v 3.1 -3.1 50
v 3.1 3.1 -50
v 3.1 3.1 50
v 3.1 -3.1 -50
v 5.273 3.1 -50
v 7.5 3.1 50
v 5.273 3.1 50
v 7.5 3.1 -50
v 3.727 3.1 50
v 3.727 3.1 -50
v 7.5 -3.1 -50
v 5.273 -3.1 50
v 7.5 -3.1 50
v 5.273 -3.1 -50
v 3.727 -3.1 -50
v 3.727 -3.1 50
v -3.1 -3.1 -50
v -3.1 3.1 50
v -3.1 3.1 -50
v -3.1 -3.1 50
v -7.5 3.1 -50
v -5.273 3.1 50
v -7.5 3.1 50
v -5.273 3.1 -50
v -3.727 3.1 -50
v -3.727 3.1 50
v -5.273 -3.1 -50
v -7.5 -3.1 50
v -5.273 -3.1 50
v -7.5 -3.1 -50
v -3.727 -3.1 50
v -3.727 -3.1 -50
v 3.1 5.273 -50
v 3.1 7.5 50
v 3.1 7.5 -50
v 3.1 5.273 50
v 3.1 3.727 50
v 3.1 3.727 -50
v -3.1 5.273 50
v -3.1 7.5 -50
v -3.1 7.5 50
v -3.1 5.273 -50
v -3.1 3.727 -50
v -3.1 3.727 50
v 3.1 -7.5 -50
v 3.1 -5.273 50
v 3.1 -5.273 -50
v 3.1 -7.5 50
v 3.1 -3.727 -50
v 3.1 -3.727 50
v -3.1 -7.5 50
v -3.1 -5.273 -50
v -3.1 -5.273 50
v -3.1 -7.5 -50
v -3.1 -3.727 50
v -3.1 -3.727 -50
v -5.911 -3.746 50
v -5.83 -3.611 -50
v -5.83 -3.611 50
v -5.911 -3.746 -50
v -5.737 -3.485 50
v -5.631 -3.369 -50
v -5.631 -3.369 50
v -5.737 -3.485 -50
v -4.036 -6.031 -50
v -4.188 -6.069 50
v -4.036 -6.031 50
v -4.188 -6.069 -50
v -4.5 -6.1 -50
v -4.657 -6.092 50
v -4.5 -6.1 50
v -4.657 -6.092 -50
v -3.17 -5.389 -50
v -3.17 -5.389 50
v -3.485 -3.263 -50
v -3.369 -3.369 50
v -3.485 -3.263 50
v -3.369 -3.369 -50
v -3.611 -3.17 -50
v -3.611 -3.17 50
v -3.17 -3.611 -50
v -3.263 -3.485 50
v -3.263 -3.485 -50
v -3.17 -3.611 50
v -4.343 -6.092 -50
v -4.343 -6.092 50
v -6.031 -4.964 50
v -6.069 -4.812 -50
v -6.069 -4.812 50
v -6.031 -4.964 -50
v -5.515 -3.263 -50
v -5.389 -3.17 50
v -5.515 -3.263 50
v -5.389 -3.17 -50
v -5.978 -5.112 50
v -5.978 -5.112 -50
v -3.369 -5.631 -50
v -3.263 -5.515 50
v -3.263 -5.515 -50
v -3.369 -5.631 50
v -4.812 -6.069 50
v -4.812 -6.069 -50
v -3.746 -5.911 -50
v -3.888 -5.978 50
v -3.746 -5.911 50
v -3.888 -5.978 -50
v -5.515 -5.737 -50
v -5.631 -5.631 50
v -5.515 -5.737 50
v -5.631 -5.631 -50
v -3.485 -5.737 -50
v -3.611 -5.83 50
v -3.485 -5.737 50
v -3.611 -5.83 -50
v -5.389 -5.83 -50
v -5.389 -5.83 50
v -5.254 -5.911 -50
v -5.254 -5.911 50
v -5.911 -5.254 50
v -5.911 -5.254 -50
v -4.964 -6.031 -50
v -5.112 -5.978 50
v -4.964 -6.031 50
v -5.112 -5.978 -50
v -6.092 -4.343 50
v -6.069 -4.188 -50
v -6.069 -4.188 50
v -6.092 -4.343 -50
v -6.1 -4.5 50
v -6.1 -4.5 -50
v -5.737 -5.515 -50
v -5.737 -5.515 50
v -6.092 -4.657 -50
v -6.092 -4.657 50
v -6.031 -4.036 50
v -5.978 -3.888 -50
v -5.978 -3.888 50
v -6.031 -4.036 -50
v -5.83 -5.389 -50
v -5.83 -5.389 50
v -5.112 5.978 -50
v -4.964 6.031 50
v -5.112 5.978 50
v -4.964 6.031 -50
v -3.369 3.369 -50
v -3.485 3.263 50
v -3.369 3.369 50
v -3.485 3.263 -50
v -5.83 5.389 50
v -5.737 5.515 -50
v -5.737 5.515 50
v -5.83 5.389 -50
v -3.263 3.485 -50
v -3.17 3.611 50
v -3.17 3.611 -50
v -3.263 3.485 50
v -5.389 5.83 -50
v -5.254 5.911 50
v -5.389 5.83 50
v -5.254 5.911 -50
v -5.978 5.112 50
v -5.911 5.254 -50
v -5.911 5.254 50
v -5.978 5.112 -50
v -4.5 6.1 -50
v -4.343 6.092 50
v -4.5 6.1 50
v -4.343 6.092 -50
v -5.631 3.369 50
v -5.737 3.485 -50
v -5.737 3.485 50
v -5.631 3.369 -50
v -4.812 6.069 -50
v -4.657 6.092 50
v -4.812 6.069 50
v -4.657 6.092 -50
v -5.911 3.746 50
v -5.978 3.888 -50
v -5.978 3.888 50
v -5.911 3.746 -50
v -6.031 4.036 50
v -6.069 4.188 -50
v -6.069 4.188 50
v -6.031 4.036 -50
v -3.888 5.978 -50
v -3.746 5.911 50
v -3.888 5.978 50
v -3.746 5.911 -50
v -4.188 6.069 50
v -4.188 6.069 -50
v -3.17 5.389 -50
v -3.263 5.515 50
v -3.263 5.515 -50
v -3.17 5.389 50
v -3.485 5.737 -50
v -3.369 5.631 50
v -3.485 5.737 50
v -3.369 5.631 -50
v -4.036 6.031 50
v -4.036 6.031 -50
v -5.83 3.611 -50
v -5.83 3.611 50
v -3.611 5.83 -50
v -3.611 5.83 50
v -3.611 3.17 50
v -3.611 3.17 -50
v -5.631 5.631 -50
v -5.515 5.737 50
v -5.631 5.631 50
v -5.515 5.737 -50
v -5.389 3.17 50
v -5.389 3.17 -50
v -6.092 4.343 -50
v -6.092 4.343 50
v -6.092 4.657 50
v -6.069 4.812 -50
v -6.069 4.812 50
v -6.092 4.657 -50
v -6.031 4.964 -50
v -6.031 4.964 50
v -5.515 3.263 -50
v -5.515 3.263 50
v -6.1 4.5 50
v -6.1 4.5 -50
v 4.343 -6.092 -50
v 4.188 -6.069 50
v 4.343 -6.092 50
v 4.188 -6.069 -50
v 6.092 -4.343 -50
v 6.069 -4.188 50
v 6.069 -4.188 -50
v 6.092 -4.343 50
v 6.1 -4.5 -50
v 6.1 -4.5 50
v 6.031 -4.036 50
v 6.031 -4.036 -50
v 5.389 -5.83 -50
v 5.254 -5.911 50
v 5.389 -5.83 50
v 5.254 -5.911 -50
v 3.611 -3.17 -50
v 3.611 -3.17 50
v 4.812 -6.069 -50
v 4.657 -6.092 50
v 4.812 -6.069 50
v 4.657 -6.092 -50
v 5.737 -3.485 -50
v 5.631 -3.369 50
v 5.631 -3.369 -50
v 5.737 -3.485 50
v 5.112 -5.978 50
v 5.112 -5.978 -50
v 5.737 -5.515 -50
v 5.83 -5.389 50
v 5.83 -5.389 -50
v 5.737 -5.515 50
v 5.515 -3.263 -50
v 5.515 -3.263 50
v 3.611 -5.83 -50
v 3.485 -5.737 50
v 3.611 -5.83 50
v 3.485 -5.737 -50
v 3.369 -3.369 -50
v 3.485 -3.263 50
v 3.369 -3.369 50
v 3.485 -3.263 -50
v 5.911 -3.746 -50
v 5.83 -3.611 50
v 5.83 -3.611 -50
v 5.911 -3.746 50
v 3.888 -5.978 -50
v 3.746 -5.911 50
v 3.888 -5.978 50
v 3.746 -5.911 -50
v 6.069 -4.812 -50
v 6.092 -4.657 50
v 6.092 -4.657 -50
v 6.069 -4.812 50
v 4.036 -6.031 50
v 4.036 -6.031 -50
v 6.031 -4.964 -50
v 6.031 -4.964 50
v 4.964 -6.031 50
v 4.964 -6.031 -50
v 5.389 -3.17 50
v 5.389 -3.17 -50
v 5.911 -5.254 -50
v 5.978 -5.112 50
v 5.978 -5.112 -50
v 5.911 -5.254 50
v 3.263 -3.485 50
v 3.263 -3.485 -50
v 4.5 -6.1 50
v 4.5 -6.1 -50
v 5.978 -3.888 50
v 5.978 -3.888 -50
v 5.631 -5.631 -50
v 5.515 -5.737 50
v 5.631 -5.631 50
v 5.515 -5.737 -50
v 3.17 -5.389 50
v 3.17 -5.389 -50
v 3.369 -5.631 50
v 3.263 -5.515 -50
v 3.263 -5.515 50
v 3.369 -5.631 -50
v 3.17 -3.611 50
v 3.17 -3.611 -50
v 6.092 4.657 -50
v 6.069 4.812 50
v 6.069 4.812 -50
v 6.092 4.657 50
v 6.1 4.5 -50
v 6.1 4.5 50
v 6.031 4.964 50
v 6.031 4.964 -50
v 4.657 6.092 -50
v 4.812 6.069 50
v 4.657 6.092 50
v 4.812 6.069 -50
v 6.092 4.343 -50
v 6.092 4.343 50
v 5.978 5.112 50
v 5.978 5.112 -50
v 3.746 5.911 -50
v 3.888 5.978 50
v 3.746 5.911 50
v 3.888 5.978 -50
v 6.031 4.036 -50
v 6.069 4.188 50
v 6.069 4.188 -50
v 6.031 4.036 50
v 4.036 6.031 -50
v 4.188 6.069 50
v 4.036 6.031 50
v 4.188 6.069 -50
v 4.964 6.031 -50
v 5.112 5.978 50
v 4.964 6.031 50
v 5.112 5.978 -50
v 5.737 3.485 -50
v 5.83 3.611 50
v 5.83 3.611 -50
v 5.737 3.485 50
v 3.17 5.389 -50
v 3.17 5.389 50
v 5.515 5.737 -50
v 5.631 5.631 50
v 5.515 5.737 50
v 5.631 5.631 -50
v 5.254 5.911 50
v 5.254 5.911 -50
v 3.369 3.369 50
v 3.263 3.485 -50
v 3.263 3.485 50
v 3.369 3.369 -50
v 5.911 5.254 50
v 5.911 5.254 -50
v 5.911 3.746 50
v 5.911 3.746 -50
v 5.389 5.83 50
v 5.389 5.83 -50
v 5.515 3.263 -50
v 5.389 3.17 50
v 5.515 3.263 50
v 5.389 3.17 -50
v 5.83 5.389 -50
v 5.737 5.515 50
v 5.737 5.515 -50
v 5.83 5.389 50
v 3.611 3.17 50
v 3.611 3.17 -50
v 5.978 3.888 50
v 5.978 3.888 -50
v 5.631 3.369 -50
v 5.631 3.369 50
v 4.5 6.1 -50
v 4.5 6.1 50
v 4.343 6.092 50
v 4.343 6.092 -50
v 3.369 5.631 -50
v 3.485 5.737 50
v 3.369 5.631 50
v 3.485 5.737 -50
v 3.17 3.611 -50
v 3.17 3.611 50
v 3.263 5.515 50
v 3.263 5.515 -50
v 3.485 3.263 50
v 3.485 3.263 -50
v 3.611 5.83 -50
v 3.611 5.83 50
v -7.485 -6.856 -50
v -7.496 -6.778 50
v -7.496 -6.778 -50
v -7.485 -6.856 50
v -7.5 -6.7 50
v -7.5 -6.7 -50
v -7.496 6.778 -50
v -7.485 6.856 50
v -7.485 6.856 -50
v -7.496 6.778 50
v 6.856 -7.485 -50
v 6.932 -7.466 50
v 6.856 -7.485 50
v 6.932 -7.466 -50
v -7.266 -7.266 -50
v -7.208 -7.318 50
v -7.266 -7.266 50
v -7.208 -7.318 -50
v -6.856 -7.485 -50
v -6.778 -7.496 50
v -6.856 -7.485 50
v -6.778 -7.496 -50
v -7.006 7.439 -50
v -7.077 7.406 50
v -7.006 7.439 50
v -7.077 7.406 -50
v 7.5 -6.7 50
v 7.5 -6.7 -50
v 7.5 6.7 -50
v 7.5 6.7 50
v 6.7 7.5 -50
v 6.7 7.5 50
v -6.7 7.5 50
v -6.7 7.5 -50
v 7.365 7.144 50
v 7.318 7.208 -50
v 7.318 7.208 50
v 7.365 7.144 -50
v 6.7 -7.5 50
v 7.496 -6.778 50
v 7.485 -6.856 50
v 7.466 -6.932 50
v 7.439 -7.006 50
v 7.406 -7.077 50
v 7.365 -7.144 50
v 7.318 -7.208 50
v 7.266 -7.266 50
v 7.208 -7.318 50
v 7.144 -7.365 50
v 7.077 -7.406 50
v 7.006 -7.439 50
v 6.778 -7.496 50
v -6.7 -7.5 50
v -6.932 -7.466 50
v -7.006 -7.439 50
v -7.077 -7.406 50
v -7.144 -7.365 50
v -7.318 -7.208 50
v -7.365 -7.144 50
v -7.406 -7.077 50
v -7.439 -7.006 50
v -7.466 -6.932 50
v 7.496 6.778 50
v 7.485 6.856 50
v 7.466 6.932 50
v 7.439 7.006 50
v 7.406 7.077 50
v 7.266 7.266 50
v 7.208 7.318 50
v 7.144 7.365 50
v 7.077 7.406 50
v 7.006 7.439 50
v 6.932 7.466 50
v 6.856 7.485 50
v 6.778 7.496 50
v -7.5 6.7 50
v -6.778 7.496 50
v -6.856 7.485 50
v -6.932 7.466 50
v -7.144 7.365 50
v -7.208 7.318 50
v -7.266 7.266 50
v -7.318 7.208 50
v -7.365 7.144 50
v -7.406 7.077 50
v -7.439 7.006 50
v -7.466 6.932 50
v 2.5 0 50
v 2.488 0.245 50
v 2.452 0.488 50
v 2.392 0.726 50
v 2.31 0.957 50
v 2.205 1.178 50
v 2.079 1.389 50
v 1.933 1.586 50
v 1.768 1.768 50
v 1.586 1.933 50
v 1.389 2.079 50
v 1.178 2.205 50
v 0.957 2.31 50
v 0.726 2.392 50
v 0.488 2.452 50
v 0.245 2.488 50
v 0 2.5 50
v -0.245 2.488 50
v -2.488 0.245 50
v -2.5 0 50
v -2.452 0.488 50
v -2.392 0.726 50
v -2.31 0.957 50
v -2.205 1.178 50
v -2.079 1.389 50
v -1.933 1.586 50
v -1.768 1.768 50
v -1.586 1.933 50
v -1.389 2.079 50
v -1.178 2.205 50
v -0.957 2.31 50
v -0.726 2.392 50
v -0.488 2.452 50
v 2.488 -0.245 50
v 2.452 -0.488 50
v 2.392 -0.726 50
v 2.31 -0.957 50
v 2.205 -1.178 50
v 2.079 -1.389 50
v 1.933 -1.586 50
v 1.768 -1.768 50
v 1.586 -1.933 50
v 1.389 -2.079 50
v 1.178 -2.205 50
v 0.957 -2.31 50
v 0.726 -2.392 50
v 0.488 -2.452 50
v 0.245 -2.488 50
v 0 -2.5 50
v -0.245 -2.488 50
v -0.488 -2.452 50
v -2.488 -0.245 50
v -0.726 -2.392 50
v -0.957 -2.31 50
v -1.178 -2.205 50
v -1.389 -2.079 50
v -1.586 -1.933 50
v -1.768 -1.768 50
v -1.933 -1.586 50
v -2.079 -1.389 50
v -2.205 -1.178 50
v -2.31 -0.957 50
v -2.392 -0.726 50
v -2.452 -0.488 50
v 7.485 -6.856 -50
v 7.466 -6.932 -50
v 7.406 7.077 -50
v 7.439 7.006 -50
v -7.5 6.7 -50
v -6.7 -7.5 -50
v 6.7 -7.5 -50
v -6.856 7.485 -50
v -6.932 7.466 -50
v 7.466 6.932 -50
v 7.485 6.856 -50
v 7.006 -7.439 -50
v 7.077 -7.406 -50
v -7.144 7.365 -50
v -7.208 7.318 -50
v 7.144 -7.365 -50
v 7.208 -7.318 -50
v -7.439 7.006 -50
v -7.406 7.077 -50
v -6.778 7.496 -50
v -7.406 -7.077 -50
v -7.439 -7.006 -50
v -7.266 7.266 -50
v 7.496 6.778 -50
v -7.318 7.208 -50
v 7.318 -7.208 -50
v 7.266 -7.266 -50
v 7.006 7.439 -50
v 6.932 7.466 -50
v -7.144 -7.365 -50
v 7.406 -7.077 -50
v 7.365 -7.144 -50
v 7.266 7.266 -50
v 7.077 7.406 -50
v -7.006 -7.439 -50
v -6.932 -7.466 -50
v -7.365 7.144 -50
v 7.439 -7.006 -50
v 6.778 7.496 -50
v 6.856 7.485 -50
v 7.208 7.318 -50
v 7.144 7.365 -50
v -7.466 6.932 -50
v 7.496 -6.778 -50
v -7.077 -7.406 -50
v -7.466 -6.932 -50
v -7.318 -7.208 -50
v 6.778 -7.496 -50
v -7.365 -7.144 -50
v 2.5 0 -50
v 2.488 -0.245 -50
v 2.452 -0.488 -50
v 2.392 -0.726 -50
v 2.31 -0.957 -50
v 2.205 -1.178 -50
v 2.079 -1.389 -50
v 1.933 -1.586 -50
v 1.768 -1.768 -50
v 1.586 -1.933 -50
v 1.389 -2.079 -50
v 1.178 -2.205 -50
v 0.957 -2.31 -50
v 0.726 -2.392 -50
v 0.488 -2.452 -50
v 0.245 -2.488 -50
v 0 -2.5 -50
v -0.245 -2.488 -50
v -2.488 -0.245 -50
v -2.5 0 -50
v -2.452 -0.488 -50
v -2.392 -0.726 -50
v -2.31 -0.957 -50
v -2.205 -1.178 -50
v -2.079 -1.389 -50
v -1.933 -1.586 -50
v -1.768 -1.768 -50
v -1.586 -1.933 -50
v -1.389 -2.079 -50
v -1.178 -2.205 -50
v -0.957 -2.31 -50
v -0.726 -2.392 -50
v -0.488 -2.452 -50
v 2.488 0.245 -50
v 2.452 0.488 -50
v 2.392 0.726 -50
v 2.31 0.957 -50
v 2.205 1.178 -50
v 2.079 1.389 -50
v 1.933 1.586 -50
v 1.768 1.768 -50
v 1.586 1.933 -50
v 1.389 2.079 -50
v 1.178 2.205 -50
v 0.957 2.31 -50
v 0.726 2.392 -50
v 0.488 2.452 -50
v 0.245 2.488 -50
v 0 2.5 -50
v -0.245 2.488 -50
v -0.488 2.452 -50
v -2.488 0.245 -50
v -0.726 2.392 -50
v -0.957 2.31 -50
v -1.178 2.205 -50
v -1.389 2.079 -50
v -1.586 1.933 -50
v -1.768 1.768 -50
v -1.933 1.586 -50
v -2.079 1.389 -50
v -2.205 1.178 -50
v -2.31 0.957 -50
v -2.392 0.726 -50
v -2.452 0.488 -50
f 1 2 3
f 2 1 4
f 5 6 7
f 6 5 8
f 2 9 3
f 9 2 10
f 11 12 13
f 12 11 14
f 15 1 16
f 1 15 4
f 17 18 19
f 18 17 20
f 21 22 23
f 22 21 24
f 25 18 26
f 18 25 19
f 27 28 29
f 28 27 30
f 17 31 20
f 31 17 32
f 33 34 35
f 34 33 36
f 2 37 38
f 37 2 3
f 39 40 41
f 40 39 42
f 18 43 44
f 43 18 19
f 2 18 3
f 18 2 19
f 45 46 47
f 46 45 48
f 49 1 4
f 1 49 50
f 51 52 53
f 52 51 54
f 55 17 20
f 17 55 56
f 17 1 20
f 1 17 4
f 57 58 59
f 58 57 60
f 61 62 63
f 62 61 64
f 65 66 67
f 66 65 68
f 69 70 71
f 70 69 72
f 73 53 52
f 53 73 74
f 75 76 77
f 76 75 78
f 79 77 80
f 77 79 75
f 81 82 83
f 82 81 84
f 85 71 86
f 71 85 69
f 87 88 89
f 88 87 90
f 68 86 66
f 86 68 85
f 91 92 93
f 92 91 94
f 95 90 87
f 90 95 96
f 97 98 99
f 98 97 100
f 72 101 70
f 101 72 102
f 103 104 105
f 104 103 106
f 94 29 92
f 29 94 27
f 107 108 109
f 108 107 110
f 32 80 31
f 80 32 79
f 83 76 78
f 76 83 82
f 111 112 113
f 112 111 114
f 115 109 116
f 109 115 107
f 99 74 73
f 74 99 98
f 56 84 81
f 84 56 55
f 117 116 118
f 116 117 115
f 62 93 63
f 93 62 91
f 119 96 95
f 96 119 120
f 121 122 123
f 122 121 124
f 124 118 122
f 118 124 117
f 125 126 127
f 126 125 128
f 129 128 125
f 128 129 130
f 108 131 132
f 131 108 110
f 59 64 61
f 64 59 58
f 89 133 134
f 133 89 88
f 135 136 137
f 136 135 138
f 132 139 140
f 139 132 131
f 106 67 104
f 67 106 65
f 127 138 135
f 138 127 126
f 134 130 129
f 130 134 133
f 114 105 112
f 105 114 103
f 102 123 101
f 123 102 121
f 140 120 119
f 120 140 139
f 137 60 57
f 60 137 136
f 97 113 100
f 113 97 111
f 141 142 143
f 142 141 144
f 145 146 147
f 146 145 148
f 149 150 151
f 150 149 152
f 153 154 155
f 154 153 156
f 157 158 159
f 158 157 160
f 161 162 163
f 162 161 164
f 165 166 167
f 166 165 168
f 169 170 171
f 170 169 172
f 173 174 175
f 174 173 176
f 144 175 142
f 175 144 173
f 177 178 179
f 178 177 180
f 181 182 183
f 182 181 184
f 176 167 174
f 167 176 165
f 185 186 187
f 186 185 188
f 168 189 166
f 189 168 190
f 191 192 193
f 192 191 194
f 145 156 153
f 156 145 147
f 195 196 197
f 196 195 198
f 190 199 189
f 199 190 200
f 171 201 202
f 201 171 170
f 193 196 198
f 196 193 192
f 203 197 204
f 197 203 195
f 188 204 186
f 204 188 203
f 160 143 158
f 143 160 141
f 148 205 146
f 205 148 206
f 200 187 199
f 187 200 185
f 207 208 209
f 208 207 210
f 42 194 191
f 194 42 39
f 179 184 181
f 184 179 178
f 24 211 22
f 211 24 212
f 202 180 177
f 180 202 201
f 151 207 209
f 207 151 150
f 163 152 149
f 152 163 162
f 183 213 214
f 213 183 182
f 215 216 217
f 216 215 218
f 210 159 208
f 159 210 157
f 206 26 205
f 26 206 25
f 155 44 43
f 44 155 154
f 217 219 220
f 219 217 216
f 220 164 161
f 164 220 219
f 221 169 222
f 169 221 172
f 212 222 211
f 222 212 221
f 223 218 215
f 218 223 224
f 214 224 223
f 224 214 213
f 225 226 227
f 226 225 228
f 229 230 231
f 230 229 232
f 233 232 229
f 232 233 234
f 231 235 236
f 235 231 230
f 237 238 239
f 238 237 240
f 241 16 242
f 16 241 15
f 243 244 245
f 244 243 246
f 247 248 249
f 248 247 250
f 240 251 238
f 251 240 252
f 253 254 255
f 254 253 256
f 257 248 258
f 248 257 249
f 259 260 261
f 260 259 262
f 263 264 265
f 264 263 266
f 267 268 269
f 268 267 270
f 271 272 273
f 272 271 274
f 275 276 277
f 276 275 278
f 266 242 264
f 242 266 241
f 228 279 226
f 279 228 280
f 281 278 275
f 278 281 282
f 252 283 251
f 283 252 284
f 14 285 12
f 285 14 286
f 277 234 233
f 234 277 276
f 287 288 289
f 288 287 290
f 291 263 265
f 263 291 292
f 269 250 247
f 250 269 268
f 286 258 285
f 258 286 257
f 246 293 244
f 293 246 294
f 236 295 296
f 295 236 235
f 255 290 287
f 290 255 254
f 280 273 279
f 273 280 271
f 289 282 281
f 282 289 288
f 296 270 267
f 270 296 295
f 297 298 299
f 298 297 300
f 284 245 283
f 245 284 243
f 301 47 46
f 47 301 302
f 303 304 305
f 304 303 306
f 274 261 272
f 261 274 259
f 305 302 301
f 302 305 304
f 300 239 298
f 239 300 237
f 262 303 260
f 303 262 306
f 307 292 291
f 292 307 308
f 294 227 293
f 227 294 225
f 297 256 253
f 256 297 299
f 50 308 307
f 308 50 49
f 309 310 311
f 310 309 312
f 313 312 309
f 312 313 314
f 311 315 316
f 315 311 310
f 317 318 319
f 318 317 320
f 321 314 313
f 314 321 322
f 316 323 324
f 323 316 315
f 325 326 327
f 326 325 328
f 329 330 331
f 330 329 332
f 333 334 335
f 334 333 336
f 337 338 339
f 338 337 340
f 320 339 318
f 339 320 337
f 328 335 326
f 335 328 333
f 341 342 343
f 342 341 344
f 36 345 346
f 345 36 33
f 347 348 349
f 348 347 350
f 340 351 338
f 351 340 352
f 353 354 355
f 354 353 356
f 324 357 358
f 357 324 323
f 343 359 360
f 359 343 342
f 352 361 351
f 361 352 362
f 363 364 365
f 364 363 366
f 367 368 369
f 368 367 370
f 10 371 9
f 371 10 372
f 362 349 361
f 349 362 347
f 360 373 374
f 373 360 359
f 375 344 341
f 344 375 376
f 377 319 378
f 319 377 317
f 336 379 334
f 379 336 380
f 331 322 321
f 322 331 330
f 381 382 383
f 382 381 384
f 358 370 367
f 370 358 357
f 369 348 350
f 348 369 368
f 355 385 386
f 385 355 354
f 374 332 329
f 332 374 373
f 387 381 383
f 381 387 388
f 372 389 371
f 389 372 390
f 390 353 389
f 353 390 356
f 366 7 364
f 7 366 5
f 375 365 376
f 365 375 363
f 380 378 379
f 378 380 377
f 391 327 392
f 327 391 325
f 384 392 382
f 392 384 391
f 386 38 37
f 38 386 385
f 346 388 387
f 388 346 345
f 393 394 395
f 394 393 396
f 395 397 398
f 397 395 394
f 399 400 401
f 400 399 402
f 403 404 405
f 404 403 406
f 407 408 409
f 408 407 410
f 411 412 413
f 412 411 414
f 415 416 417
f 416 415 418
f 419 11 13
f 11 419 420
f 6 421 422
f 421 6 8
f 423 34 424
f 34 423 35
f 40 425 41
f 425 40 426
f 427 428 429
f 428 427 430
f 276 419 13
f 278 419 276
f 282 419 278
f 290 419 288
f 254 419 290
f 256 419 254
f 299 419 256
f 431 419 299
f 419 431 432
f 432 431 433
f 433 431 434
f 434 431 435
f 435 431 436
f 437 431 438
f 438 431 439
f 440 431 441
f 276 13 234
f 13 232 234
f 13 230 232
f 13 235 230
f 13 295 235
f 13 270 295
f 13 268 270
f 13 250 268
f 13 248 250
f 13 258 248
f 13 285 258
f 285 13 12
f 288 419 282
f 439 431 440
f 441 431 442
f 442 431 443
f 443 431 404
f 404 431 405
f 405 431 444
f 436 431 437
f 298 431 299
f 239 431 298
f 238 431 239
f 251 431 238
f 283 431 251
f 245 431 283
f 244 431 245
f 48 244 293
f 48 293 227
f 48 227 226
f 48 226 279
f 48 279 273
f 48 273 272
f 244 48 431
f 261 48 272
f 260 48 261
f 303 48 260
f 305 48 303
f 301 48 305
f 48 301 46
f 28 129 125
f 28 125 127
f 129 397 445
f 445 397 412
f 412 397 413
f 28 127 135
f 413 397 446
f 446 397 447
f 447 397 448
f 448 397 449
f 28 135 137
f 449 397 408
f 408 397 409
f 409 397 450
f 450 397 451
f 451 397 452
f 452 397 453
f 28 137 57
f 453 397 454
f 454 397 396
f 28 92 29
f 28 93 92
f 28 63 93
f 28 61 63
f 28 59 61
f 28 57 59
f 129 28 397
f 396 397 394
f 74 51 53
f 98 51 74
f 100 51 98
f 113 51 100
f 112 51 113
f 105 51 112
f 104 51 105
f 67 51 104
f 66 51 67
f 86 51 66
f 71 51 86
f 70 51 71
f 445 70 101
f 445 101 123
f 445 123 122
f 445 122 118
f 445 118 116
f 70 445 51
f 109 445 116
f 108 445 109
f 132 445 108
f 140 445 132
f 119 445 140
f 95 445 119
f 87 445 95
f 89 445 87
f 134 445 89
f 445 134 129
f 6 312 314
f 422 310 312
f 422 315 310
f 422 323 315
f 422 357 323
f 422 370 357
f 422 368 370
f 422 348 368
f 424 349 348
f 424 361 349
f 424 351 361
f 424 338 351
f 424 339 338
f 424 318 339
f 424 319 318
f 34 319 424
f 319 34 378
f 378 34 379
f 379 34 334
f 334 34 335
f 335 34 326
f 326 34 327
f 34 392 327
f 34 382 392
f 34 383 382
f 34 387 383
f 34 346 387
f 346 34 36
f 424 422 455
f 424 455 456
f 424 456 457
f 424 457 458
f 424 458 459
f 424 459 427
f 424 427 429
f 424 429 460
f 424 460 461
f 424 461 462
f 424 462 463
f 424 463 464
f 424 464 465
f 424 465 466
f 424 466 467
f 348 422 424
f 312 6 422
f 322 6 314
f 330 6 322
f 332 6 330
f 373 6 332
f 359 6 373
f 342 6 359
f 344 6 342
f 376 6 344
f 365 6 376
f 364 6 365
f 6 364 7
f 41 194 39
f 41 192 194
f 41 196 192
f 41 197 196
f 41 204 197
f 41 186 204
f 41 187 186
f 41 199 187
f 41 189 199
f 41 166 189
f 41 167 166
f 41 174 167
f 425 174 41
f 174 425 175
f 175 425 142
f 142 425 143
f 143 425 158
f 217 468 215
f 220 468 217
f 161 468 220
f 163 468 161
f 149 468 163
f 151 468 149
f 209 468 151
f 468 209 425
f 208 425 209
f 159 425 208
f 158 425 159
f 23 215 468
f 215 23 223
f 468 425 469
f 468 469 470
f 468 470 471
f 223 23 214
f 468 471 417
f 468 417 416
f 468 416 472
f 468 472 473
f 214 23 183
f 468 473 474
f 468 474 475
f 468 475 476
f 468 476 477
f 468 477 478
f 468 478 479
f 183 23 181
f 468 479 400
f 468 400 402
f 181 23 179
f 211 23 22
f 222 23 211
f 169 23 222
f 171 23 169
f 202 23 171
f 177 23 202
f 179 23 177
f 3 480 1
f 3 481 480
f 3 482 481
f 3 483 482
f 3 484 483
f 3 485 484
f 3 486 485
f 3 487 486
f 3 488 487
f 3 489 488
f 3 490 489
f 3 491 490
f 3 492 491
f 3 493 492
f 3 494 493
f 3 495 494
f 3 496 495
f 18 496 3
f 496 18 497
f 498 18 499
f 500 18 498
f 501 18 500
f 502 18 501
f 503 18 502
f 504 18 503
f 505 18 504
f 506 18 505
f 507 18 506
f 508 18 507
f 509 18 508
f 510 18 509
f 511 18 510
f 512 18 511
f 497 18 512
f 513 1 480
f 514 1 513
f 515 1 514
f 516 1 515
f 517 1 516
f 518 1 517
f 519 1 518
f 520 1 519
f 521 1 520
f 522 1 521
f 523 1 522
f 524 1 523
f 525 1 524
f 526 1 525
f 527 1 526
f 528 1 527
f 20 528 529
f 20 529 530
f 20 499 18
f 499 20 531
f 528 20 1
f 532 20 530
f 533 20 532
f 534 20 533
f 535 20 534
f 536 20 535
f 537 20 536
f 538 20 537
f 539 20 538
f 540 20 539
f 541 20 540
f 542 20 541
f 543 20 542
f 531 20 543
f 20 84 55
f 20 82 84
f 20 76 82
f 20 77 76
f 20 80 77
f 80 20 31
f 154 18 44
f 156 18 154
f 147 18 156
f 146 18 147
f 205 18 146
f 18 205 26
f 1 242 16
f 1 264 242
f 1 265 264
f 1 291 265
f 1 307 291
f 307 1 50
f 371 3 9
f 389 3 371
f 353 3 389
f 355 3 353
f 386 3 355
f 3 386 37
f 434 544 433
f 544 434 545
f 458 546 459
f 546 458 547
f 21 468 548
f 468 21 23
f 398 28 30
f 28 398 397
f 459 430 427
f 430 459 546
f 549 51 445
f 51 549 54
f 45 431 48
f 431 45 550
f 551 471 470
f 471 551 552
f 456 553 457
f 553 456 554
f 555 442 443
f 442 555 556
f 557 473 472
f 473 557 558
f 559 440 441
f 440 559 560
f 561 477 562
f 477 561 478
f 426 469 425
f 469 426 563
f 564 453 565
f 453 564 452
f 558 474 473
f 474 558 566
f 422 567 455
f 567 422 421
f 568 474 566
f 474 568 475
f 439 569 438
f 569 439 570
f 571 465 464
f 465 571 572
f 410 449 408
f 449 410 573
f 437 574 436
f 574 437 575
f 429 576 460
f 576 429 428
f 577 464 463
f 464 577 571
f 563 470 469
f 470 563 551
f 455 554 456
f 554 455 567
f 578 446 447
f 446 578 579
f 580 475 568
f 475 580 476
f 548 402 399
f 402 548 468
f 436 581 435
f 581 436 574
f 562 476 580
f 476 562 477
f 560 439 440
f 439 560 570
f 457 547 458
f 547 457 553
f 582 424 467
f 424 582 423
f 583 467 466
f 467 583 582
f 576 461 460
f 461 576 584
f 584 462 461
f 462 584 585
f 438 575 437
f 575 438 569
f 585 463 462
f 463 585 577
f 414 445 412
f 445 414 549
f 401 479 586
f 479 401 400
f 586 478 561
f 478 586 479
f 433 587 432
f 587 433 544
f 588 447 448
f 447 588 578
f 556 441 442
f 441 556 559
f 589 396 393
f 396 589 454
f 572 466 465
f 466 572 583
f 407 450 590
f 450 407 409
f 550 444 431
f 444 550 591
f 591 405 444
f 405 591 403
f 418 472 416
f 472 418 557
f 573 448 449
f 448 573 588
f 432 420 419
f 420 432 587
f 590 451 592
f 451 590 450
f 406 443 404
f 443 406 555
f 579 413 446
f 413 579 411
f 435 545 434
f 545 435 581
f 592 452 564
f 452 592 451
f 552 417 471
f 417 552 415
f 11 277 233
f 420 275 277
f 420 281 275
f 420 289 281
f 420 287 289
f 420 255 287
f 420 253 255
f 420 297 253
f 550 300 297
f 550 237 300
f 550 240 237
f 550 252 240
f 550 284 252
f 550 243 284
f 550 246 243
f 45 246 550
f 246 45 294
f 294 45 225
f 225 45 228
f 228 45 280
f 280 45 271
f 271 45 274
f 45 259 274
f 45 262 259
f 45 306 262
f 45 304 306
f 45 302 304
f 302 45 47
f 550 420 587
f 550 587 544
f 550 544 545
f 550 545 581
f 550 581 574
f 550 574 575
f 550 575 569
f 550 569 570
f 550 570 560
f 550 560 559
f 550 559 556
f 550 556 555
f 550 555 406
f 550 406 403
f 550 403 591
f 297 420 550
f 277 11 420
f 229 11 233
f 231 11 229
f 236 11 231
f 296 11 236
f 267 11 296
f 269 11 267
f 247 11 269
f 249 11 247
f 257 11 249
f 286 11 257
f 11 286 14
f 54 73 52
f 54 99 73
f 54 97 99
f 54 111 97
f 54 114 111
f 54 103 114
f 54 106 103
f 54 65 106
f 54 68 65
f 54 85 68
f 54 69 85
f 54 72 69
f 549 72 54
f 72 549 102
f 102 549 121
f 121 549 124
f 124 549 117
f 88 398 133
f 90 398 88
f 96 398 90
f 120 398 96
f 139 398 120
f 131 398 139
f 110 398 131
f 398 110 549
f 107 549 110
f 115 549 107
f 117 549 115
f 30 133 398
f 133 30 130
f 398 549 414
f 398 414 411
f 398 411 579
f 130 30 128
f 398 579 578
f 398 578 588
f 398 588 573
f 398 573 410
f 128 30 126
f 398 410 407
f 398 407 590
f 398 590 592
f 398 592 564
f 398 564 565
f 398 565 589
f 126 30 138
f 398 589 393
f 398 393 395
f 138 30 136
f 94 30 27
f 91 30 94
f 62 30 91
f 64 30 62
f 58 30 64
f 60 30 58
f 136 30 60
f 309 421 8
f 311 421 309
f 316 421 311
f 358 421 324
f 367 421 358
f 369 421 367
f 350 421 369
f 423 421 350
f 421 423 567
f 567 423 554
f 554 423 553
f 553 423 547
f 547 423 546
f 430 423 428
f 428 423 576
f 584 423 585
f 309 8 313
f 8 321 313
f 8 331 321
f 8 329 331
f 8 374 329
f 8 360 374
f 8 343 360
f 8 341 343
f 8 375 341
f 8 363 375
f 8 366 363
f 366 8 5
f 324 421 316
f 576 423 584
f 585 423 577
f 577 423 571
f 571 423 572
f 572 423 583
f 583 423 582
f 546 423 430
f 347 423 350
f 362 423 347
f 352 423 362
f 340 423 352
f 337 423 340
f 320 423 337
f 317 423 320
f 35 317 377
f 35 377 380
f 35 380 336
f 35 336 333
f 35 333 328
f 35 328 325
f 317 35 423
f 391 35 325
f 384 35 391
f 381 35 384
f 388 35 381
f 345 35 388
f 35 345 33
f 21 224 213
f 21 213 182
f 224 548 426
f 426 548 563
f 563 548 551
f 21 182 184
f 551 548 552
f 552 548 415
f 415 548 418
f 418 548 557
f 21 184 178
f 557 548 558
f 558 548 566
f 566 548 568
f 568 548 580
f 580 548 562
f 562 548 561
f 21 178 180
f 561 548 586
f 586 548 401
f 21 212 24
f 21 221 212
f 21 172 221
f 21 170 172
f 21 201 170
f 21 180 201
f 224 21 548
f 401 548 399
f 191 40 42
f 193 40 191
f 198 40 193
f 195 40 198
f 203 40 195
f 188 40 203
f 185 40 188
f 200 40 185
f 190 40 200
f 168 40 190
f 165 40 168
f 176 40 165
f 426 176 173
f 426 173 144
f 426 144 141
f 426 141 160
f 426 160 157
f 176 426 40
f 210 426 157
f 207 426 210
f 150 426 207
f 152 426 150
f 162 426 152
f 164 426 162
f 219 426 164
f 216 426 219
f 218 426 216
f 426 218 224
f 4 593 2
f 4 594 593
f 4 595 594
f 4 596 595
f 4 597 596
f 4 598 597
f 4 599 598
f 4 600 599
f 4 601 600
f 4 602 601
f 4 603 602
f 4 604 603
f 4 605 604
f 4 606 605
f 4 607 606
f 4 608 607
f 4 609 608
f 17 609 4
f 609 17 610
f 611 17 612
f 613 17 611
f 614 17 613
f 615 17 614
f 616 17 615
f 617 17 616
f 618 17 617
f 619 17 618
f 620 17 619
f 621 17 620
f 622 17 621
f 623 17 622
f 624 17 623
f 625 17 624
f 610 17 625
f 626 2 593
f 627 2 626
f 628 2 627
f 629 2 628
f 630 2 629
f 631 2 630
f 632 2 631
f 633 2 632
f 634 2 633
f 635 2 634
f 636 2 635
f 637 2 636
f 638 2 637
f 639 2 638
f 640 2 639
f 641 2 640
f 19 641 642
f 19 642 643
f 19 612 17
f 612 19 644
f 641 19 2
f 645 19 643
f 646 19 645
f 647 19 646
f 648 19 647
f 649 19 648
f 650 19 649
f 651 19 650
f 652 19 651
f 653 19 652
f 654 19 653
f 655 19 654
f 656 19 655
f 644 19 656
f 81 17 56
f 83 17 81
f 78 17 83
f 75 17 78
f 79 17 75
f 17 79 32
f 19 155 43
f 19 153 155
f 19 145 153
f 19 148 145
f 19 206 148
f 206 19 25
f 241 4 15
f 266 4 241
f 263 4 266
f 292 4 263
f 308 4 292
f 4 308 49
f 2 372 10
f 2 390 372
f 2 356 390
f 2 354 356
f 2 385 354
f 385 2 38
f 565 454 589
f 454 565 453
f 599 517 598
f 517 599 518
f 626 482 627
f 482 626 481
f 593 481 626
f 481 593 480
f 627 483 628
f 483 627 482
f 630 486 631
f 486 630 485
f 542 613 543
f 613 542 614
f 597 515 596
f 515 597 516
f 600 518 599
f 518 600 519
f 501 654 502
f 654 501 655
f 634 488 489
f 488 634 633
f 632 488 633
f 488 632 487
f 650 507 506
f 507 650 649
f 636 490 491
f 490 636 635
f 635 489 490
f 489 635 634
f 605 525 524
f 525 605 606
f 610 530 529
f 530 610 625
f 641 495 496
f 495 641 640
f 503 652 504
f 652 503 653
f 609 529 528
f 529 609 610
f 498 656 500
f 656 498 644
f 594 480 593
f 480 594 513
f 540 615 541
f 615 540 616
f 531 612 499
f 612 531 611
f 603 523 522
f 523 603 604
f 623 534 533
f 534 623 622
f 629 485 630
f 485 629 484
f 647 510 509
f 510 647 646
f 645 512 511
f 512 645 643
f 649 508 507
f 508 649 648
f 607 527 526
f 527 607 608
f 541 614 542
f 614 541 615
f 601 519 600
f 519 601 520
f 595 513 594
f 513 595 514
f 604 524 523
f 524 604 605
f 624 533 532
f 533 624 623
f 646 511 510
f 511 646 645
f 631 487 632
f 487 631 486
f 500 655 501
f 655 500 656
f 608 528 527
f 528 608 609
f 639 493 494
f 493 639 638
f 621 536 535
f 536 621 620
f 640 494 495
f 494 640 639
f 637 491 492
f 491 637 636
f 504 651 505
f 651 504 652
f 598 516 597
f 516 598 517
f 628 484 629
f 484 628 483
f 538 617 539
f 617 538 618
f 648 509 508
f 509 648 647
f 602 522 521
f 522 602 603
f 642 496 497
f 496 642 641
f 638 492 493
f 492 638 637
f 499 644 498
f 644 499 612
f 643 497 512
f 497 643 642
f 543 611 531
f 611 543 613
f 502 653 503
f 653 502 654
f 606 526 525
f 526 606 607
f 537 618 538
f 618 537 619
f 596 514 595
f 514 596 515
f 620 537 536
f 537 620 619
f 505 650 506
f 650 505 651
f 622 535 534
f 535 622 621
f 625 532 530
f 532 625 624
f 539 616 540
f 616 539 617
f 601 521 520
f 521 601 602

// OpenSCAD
// Aluminium extrusion profile (simplified but verifiable)
// Exact overall size: 15mm x 15mm cross-section, 100mm length
// One connected solid (single difference() from one outer body)

$fn = 64;

// Parameters (fixed to requested dimensions)
cross_section_width_mm  = 15.0;
cross_section_height_mm = 15.0;
length_mm               = 100.0;

// Small overlap for robust boolean operations
overlap_mm = 0.2;

// Outer corner radius (kept modest)
outer_corner_radius_mm = 0.8;

// Internal features (kept similar to original intent)
center_bore_radius_mm = 2.5;

slot_opening_width_mm = 3.2;
slot_opening_depth_mm = 2.2;

slot_cavity_width_mm  = 6.2;
slot_cavity_depth_mm  = 4.2;

cornerHole = 1;
corner_hole_radius_mm = 1.6;
corner_hole_offset_from_corner_mm = 3.0;

// ---- Helpers ----
module rounded_square_2d(w, h, r) {
    r2 = min(r, min(w, h)/2);
    hull() {
        translate([ w/2 - r2,  h/2 - r2]) circle(r=r2);
        translate([-w/2 + r2,  h/2 - r2]) circle(r=r2);
        translate([-w/2 + r2, -h/2 + r2]) circle(r=r2);
        translate([ w/2 - r2, -h/2 + r2]) circle(r=r2);
    }
}

module outer_body() {
    // Extrude along Z to make a 100mm long profile
    linear_extrude(height=length_mm, center=true, convexity=10)
        rounded_square_2d(cross_section_width_mm, cross_section_height_mm, outer_corner_radius_mm);
}

module slot_cuts() {
    // Slots cut from each face, positioned by formulas from dimensions
    // X+ face
    translate([ cross_section_width_mm/2 - (slot_opening_depth_mm)/2, 0, 0])
        cube([slot_opening_depth_mm + 2*overlap_mm, slot_opening_width_mm, length_mm + 2*overlap_mm], center=true);
    translate([ cross_section_width_mm/2 - (slot_cavity_depth_mm)/2, 0, 0])
        cube([slot_cavity_depth_mm + 2*overlap_mm, slot_cavity_width_mm, length_mm + 2*overlap_mm], center=true);

    // X- face
    translate([-cross_section_width_mm/2 + (slot_opening_depth_mm)/2, 0, 0])
        cube([slot_opening_depth_mm + 2*overlap_mm, slot_opening_width_mm, length_mm + 2*overlap_mm], center=true);
    translate([-cross_section_width_mm/2 + (slot_cavity_depth_mm)/2, 0, 0])
        cube([slot_cavity_depth_mm + 2*overlap_mm, slot_cavity_width_mm, length_mm + 2*overlap_mm], center=true);

    // Y+ face
    translate([0, cross_section_height_mm/2 - (slot_opening_depth_mm)/2, 0])
        cube([slot_opening_width_mm, slot_opening_depth_mm + 2*overlap_mm, length_mm + 2*overlap_mm], center=true);
    translate([0, cross_section_height_mm/2 - (slot_cavity_depth_mm)/2, 0])
        cube([slot_cavity_width_mm, slot_cavity_depth_mm + 2*overlap_mm, length_mm + 2*overlap_mm], center=true);

    // Y- face
    translate([0, -cross_section_height_mm/2 + (slot_opening_depth_mm)/2, 0])
        cube([slot_opening_width_mm, slot_opening_depth_mm + 2*overlap_mm, length_mm + 2*overlap_mm], center=true);
    translate([0, -cross_section_height_mm/2 + (slot_cavity_depth_mm)/2, 0])
        cube([slot_cavity_width_mm, slot_cavity_depth_mm + 2*overlap_mm, length_mm + 2*overlap_mm], center=true);
}

module corner_hole_cuts() {
    if (cornerHole) {
        for (sx = [-1, 1], sy = [-1, 1]) {
            translate([
                sx*(cross_section_width_mm/2  - corner_hole_offset_from_corner_mm),
                sy*(cross_section_height_mm/2 - corner_hole_offset_from_corner_mm),
                0
            ])
            cylinder(r=corner_hole_radius_mm, h=length_mm + 2*overlap_mm, center=true);
        }
    }
}

// ---- Main model ----
module extrusion() {
    color("Silver")
    difference() {
        outer_body();

        // Center bore
        cylinder(r=center_bore_radius_mm, h=length_mm + 2*overlap_mm, center=true);

        // T-slots
        slot_cuts();

        // Optional corner holes
        corner_hole_cuts();
    }
}

extrusion();
